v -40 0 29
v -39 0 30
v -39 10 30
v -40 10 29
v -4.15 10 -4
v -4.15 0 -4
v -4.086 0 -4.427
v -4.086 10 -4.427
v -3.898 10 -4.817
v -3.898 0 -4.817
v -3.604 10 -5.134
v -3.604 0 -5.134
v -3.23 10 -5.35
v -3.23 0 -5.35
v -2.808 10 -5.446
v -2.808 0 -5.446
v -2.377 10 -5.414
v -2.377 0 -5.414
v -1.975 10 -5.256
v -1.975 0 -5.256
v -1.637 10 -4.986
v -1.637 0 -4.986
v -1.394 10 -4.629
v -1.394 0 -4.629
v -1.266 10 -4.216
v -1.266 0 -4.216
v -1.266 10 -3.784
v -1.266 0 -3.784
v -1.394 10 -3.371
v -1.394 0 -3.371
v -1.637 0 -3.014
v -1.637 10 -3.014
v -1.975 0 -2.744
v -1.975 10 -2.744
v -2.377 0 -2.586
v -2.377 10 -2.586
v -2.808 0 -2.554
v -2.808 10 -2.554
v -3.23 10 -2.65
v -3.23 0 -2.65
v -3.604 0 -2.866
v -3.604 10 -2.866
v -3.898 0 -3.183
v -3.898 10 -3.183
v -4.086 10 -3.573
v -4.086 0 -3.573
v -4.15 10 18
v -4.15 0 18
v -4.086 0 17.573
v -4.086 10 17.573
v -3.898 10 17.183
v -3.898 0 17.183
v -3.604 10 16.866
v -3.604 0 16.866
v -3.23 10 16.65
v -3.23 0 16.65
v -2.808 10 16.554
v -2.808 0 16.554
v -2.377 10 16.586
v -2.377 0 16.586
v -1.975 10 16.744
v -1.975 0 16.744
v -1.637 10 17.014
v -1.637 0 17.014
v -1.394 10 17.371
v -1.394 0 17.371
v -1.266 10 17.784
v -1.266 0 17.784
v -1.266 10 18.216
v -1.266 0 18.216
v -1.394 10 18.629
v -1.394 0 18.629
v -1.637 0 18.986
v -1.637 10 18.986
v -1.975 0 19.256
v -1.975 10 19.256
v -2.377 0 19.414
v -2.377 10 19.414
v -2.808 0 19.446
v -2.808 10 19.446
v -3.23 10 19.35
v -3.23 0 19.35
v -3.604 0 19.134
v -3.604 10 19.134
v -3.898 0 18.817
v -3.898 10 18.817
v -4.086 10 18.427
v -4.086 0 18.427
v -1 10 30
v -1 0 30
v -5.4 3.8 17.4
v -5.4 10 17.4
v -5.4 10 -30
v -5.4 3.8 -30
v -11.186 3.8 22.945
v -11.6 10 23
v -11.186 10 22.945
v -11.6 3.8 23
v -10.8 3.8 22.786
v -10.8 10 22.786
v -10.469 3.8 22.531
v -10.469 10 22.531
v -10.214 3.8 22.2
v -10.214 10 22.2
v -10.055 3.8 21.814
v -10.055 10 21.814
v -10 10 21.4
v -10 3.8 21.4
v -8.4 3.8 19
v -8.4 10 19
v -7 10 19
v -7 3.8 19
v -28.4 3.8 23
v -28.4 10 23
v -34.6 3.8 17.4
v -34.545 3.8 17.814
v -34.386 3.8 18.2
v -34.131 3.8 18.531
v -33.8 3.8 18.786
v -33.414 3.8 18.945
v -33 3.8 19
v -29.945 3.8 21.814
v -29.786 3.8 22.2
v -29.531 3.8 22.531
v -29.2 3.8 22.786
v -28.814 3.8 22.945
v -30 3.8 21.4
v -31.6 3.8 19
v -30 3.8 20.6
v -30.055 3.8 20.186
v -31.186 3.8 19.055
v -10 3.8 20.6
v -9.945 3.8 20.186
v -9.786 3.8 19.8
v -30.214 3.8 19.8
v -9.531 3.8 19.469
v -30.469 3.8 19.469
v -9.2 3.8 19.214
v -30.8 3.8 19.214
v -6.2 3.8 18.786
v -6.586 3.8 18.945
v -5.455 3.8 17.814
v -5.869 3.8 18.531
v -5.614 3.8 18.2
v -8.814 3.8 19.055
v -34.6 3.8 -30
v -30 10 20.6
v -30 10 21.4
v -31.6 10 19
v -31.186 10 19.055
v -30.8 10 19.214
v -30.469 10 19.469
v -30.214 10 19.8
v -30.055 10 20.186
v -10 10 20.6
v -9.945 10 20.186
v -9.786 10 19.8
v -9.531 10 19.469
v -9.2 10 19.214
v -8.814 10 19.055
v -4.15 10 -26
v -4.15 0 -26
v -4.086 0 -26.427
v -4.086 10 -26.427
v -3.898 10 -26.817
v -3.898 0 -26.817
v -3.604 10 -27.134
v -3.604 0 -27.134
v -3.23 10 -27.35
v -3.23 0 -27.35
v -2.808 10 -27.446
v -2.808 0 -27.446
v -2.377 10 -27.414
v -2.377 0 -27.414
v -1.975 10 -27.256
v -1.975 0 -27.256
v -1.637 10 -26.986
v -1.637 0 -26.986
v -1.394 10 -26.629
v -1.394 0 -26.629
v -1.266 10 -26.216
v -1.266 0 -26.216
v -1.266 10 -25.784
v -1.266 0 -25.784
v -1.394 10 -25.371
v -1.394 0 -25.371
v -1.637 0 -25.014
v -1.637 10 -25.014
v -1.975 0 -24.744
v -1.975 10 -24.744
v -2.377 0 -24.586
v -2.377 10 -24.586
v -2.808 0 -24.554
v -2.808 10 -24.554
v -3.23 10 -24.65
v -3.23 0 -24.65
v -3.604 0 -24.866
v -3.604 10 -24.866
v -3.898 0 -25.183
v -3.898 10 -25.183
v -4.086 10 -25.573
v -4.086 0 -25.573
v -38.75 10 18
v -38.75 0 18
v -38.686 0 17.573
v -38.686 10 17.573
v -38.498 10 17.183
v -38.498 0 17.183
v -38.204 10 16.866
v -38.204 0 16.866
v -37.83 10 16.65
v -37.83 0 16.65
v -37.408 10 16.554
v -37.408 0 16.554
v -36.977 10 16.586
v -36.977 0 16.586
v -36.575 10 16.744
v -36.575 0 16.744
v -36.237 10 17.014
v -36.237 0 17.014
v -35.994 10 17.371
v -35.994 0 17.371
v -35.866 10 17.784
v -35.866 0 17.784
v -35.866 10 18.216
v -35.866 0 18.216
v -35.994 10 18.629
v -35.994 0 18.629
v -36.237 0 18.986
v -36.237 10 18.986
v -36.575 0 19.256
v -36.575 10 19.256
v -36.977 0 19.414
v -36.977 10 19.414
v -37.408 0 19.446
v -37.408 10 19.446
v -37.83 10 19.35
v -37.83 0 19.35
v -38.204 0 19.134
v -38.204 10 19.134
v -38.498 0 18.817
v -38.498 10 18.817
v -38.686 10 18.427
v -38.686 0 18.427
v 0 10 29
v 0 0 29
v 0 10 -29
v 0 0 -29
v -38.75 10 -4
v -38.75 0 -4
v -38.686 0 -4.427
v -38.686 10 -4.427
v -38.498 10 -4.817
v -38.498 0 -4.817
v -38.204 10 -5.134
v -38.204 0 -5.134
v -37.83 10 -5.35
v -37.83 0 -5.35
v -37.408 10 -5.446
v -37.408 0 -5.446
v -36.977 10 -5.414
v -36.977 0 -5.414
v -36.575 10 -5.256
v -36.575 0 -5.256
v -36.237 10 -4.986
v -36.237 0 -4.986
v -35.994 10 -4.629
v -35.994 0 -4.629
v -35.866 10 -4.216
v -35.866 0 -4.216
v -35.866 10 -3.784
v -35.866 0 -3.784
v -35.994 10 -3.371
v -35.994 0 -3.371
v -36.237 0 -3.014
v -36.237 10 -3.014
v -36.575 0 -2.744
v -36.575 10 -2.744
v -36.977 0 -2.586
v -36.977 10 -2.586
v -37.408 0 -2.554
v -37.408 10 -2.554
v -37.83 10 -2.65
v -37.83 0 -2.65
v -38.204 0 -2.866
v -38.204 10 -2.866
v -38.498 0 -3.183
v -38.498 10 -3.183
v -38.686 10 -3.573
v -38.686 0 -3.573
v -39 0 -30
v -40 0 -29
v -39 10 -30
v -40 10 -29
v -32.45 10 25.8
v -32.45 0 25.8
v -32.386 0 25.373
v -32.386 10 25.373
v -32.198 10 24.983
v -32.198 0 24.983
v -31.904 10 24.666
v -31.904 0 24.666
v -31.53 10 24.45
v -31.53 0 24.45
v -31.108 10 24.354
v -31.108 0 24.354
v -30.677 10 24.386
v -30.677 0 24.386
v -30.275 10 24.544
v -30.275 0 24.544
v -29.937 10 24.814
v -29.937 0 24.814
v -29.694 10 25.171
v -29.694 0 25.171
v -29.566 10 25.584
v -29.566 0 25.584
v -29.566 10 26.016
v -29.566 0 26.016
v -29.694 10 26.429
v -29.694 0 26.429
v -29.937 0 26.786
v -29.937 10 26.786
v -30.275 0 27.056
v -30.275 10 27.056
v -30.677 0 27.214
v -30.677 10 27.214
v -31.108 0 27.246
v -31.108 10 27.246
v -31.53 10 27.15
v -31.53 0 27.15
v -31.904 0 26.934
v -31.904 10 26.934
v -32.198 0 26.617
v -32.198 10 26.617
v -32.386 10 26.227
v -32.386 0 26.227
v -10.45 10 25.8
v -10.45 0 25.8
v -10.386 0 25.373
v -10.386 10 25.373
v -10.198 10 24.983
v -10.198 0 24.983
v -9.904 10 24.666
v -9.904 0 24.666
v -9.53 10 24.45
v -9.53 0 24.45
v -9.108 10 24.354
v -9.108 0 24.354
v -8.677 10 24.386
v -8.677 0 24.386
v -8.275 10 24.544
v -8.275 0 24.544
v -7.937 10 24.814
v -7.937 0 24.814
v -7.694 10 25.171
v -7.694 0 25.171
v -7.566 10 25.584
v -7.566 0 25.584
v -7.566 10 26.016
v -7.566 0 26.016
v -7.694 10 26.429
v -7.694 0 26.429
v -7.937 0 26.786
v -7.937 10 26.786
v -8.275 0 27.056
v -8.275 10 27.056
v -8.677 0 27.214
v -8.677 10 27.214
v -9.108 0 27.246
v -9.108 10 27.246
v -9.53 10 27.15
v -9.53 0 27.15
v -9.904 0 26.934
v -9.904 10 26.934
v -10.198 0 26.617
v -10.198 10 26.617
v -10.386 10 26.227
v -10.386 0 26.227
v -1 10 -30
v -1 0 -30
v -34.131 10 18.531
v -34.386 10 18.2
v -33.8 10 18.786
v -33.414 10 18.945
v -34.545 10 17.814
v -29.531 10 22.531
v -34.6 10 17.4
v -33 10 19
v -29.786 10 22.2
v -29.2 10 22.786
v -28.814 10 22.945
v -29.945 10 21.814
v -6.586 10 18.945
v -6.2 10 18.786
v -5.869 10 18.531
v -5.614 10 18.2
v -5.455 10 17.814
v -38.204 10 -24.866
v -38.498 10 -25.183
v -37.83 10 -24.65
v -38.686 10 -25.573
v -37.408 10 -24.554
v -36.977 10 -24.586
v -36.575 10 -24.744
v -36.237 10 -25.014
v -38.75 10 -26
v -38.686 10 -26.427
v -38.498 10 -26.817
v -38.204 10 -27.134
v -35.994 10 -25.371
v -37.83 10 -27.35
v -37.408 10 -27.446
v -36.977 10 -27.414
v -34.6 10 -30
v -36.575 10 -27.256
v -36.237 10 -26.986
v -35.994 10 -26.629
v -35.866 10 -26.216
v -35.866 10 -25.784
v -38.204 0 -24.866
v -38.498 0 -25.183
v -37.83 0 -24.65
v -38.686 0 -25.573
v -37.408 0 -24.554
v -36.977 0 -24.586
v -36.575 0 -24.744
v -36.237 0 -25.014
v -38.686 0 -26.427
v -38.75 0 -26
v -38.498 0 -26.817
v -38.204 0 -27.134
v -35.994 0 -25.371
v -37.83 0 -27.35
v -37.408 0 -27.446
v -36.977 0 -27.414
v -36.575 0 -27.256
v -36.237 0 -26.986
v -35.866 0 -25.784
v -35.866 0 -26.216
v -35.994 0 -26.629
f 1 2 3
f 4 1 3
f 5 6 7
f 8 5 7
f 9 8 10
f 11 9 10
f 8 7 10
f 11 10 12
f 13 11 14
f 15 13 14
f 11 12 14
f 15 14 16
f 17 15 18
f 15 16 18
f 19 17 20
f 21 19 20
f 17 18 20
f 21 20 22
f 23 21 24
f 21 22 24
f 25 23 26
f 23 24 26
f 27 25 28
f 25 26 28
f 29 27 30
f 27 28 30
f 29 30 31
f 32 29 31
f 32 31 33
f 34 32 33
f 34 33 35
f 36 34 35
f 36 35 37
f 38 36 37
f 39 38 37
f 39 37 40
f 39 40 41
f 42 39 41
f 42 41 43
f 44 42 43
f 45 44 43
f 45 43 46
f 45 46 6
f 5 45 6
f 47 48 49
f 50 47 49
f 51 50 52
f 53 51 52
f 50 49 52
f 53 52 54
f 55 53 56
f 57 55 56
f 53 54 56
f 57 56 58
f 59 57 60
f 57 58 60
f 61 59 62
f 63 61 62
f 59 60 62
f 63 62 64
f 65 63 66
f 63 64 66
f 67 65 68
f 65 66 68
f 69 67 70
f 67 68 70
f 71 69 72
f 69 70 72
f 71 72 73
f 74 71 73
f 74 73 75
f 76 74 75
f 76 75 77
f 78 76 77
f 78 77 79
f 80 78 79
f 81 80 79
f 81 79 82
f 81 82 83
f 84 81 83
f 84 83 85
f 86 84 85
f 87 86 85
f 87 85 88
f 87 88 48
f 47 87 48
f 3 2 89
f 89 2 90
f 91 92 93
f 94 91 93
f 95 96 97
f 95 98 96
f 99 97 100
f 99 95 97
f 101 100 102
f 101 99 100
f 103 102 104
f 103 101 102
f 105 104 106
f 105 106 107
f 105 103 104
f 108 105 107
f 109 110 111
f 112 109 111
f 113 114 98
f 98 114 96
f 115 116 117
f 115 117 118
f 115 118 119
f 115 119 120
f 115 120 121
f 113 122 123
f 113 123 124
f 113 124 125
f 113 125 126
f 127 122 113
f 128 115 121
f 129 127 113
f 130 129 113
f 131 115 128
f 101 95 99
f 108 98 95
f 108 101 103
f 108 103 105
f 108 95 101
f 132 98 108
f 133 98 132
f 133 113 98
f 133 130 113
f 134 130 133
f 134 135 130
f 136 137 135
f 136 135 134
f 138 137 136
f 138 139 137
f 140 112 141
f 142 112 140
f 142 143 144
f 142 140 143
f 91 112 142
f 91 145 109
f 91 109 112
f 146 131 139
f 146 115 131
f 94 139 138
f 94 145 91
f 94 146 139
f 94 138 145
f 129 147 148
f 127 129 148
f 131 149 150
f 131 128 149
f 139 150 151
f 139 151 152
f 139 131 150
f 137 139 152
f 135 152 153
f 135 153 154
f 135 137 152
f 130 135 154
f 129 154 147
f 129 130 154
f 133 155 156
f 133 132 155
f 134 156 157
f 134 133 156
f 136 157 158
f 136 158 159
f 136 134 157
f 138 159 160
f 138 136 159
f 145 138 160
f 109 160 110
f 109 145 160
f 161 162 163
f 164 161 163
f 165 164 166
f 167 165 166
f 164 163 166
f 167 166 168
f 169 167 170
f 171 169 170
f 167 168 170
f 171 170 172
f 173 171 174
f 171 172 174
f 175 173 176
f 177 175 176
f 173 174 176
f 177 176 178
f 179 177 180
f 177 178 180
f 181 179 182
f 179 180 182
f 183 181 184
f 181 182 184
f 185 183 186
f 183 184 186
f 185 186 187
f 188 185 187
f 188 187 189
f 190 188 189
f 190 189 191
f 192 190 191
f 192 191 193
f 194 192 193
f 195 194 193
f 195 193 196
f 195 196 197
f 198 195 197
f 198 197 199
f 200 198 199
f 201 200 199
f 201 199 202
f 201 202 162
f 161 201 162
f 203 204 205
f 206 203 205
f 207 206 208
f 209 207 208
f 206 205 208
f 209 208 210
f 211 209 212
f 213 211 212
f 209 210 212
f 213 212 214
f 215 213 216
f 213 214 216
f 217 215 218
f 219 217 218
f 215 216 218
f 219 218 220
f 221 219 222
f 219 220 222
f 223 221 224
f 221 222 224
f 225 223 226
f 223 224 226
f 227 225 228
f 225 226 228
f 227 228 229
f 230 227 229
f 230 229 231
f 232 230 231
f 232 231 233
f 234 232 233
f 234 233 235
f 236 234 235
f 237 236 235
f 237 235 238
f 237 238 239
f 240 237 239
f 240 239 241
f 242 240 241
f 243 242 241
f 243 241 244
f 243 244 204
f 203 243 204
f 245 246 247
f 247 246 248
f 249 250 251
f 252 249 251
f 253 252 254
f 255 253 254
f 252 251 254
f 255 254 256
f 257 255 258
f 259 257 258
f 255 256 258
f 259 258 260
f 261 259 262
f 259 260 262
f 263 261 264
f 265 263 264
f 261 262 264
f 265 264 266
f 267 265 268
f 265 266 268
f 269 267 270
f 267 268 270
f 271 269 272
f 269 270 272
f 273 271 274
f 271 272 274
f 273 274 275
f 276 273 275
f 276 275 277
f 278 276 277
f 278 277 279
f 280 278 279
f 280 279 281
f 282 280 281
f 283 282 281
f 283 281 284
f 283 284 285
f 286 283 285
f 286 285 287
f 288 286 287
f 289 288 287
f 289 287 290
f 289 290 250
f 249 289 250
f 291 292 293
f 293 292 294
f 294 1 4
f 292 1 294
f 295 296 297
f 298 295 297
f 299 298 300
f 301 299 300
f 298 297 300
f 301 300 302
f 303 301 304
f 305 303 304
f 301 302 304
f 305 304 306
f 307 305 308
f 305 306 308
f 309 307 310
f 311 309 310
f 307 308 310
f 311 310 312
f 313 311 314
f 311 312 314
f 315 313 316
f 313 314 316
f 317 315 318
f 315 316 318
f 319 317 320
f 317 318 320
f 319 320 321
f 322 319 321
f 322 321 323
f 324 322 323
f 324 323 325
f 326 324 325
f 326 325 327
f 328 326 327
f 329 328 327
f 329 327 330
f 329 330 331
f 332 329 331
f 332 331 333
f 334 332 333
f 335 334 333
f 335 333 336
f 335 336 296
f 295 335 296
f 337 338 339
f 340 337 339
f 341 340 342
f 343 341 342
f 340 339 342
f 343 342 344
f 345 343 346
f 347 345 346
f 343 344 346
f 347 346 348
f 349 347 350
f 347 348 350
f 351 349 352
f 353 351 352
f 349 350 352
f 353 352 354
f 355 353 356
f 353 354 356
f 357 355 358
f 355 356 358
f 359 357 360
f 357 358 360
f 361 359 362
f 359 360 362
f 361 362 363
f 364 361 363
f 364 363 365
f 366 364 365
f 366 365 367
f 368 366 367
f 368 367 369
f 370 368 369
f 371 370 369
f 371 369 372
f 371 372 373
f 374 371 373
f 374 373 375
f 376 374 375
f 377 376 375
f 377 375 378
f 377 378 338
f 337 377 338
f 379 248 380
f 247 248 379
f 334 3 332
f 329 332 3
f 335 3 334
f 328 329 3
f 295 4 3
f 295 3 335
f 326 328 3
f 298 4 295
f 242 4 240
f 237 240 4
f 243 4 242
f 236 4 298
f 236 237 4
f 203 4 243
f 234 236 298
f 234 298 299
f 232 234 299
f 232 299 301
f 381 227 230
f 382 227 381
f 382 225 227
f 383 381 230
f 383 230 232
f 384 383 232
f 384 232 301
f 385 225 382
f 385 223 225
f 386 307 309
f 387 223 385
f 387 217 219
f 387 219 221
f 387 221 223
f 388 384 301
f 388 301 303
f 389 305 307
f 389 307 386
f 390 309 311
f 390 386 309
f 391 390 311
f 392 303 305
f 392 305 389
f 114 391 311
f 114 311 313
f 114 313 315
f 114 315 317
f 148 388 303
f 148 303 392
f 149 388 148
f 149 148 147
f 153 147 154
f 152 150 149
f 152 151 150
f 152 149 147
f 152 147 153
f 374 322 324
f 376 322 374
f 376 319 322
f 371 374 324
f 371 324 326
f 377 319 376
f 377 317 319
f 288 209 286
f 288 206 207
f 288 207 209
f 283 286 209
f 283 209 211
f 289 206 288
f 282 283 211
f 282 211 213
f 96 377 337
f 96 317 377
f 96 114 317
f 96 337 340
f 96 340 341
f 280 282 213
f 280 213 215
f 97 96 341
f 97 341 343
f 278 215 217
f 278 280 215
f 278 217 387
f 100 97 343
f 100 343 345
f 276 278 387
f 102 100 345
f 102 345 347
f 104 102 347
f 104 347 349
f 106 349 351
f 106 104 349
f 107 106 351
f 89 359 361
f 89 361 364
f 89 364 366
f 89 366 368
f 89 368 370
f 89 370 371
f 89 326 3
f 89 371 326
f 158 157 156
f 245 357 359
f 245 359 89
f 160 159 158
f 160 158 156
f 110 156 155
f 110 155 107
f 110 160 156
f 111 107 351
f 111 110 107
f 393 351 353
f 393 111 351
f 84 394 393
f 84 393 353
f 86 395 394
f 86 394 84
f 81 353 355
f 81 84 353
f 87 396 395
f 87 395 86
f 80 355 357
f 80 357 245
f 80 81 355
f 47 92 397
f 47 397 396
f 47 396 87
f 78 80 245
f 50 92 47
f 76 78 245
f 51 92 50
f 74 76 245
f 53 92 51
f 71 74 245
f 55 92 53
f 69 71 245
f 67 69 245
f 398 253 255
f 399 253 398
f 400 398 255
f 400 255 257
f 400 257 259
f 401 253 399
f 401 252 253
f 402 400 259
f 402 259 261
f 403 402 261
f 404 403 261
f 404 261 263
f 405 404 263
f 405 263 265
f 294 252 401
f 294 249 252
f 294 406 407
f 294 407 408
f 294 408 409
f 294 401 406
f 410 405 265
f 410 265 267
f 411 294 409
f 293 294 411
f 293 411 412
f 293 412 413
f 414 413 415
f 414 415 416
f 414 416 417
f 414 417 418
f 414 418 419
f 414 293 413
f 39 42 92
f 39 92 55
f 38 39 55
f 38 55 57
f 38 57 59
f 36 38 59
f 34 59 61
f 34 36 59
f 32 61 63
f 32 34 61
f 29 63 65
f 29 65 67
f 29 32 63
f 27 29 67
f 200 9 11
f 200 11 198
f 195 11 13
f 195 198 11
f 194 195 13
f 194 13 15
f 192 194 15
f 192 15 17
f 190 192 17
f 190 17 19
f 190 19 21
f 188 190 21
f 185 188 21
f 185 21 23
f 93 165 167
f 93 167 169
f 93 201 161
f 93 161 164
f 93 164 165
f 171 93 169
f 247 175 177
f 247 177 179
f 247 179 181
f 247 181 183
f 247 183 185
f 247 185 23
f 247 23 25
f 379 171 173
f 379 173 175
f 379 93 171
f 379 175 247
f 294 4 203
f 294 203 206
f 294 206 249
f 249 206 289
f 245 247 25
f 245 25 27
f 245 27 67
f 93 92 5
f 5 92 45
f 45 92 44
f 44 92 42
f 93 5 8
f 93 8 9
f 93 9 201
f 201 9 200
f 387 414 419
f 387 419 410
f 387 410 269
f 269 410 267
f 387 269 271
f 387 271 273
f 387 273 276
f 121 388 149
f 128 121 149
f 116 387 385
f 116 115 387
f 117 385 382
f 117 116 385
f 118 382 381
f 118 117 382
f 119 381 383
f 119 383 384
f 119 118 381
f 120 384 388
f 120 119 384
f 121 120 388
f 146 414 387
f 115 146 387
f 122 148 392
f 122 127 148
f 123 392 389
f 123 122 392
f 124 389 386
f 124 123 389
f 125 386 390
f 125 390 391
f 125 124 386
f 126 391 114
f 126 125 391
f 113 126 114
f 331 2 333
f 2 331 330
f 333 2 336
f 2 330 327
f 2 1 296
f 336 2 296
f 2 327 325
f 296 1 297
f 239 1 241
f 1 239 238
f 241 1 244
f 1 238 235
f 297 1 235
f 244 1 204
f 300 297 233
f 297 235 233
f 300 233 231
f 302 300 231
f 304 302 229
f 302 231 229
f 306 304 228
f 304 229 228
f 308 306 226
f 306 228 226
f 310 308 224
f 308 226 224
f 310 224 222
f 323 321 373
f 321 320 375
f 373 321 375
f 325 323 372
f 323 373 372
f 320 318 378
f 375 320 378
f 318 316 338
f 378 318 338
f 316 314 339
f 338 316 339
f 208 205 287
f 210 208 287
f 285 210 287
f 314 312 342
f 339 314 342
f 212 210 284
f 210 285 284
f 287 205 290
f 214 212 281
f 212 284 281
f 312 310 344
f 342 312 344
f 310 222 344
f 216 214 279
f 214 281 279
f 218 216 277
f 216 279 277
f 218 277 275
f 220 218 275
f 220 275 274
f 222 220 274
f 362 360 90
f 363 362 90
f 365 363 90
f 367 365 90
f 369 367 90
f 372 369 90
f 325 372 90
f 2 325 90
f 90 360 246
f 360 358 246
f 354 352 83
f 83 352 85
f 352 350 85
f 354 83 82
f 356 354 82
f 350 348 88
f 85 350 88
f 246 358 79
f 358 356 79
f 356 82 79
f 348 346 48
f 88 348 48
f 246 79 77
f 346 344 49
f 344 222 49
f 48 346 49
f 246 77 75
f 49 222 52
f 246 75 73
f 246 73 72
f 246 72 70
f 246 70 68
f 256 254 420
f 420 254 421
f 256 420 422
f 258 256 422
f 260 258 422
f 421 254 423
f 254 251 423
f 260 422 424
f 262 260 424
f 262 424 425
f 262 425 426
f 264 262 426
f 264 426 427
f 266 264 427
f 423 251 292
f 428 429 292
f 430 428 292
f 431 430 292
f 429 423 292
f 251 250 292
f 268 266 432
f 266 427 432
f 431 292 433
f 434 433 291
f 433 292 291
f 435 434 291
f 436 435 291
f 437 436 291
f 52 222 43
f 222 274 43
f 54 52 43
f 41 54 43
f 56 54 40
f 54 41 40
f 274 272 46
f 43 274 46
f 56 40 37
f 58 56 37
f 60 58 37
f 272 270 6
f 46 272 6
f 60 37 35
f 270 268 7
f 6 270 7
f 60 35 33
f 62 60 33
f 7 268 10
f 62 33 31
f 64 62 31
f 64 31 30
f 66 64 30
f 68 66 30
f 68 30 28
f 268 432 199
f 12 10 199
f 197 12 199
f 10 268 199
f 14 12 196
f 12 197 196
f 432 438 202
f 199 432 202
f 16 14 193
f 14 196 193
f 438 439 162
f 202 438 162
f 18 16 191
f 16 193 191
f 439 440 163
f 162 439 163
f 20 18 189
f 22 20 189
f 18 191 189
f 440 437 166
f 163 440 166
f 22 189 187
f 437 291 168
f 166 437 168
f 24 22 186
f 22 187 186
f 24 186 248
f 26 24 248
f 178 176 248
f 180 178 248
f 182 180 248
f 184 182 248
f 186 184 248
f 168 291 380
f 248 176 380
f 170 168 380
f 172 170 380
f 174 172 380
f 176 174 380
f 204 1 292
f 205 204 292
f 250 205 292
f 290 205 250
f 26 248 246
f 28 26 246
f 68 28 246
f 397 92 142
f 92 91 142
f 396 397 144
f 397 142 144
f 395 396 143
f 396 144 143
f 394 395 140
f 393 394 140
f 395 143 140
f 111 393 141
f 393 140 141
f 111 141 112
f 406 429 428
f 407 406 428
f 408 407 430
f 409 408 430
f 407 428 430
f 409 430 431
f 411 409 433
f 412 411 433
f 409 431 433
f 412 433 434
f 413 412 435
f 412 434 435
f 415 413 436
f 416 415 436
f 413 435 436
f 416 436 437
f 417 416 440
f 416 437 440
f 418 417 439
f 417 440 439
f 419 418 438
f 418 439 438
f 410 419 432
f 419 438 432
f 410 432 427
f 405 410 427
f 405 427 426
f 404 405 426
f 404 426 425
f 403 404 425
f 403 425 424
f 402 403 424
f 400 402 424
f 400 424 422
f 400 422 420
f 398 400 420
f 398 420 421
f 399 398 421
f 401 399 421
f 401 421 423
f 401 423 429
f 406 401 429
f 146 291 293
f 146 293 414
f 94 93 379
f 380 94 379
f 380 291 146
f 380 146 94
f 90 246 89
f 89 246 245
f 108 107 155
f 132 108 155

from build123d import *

# Parameters (mm, degrees)
SKETCH1_W              = 40
SKETCH1_H              = 60
BOSS_EXTRUDE1_DEPTH    = 10
M2_5_CLEARANCE_HOLE1_D = 2.9
CUT_EXTRUDE1_DEPTH     = 6.2
FILLET1_R              = 1.6
CHAMFER1_SIZE          = 1


with BuildPart() as part:
    # Sketch1 → Boss-Extrude1 (new body)
    with BuildSketch(Plane(origin=(0, 0, 0), x_dir=(1, 0, 0), z_dir=(0, 1, 0))):
        with Locations((-20, 0)):
            Rectangle(SKETCH1_W, SKETCH1_H)
    extrude(amount=BOSS_EXTRUDE1_DEPTH)

    # M2.5 Clearance Hole1 (through all)
    with Locations(Plane(origin=(0, 10, 0), x_dir=(1, 0, 0), z_dir=(0, 1, 0))):
        with Locations((-37.3, 26), (-37.3, 4), (-37.3, -18), (-31, -25.8), (-9, -25.8), (-2.7, -18), (-2.7, 4), (-2.7, 26)):
            Hole(M2_5_CLEARANCE_HOLE1_D / 2)

    # Sketch4 → Cut-Extrude1 (cut)
    with BuildSketch(Plane(origin=(0, 10, 0), x_dir=(1, 0, 0), z_dir=(0, 1, 0))):
        Polygon((-34.6, 30), (-34.6, -19), (-30, -19), (-30, -23), (-10, -23), (-10, -19), (-5.4, -19), (-5.4, 30), align=None)
    extrude(amount=-CUT_EXTRUDE1_DEPTH, mode=Mode.SUBTRACT)

    # Fillet1
    fillet1_edges = [part.edges().sort_by_distance(p)[0] for p in [
        (-10, 6.9, 23),
        (-30, 6.9, 23),
        (-30, 6.9, 19),
        (-34.6, 6.9, 19),
        (-5.4, 6.9, 19),
        (-10, 6.9, 19),
    ]]
    fillet(fillet1_edges, radius=FILLET1_R)

    # Chamfer1
    chamfer1_edges = [part.edges().sort_by_distance(p)[0] for p in [
        (-40, 5, -30),
        (0, 5, -30),
        (0, 5, 30),
        (-40, 5, 30),
    ]]
    chamfer(chamfer1_edges, length=CHAMFER1_SIZE)


solid = part.part
